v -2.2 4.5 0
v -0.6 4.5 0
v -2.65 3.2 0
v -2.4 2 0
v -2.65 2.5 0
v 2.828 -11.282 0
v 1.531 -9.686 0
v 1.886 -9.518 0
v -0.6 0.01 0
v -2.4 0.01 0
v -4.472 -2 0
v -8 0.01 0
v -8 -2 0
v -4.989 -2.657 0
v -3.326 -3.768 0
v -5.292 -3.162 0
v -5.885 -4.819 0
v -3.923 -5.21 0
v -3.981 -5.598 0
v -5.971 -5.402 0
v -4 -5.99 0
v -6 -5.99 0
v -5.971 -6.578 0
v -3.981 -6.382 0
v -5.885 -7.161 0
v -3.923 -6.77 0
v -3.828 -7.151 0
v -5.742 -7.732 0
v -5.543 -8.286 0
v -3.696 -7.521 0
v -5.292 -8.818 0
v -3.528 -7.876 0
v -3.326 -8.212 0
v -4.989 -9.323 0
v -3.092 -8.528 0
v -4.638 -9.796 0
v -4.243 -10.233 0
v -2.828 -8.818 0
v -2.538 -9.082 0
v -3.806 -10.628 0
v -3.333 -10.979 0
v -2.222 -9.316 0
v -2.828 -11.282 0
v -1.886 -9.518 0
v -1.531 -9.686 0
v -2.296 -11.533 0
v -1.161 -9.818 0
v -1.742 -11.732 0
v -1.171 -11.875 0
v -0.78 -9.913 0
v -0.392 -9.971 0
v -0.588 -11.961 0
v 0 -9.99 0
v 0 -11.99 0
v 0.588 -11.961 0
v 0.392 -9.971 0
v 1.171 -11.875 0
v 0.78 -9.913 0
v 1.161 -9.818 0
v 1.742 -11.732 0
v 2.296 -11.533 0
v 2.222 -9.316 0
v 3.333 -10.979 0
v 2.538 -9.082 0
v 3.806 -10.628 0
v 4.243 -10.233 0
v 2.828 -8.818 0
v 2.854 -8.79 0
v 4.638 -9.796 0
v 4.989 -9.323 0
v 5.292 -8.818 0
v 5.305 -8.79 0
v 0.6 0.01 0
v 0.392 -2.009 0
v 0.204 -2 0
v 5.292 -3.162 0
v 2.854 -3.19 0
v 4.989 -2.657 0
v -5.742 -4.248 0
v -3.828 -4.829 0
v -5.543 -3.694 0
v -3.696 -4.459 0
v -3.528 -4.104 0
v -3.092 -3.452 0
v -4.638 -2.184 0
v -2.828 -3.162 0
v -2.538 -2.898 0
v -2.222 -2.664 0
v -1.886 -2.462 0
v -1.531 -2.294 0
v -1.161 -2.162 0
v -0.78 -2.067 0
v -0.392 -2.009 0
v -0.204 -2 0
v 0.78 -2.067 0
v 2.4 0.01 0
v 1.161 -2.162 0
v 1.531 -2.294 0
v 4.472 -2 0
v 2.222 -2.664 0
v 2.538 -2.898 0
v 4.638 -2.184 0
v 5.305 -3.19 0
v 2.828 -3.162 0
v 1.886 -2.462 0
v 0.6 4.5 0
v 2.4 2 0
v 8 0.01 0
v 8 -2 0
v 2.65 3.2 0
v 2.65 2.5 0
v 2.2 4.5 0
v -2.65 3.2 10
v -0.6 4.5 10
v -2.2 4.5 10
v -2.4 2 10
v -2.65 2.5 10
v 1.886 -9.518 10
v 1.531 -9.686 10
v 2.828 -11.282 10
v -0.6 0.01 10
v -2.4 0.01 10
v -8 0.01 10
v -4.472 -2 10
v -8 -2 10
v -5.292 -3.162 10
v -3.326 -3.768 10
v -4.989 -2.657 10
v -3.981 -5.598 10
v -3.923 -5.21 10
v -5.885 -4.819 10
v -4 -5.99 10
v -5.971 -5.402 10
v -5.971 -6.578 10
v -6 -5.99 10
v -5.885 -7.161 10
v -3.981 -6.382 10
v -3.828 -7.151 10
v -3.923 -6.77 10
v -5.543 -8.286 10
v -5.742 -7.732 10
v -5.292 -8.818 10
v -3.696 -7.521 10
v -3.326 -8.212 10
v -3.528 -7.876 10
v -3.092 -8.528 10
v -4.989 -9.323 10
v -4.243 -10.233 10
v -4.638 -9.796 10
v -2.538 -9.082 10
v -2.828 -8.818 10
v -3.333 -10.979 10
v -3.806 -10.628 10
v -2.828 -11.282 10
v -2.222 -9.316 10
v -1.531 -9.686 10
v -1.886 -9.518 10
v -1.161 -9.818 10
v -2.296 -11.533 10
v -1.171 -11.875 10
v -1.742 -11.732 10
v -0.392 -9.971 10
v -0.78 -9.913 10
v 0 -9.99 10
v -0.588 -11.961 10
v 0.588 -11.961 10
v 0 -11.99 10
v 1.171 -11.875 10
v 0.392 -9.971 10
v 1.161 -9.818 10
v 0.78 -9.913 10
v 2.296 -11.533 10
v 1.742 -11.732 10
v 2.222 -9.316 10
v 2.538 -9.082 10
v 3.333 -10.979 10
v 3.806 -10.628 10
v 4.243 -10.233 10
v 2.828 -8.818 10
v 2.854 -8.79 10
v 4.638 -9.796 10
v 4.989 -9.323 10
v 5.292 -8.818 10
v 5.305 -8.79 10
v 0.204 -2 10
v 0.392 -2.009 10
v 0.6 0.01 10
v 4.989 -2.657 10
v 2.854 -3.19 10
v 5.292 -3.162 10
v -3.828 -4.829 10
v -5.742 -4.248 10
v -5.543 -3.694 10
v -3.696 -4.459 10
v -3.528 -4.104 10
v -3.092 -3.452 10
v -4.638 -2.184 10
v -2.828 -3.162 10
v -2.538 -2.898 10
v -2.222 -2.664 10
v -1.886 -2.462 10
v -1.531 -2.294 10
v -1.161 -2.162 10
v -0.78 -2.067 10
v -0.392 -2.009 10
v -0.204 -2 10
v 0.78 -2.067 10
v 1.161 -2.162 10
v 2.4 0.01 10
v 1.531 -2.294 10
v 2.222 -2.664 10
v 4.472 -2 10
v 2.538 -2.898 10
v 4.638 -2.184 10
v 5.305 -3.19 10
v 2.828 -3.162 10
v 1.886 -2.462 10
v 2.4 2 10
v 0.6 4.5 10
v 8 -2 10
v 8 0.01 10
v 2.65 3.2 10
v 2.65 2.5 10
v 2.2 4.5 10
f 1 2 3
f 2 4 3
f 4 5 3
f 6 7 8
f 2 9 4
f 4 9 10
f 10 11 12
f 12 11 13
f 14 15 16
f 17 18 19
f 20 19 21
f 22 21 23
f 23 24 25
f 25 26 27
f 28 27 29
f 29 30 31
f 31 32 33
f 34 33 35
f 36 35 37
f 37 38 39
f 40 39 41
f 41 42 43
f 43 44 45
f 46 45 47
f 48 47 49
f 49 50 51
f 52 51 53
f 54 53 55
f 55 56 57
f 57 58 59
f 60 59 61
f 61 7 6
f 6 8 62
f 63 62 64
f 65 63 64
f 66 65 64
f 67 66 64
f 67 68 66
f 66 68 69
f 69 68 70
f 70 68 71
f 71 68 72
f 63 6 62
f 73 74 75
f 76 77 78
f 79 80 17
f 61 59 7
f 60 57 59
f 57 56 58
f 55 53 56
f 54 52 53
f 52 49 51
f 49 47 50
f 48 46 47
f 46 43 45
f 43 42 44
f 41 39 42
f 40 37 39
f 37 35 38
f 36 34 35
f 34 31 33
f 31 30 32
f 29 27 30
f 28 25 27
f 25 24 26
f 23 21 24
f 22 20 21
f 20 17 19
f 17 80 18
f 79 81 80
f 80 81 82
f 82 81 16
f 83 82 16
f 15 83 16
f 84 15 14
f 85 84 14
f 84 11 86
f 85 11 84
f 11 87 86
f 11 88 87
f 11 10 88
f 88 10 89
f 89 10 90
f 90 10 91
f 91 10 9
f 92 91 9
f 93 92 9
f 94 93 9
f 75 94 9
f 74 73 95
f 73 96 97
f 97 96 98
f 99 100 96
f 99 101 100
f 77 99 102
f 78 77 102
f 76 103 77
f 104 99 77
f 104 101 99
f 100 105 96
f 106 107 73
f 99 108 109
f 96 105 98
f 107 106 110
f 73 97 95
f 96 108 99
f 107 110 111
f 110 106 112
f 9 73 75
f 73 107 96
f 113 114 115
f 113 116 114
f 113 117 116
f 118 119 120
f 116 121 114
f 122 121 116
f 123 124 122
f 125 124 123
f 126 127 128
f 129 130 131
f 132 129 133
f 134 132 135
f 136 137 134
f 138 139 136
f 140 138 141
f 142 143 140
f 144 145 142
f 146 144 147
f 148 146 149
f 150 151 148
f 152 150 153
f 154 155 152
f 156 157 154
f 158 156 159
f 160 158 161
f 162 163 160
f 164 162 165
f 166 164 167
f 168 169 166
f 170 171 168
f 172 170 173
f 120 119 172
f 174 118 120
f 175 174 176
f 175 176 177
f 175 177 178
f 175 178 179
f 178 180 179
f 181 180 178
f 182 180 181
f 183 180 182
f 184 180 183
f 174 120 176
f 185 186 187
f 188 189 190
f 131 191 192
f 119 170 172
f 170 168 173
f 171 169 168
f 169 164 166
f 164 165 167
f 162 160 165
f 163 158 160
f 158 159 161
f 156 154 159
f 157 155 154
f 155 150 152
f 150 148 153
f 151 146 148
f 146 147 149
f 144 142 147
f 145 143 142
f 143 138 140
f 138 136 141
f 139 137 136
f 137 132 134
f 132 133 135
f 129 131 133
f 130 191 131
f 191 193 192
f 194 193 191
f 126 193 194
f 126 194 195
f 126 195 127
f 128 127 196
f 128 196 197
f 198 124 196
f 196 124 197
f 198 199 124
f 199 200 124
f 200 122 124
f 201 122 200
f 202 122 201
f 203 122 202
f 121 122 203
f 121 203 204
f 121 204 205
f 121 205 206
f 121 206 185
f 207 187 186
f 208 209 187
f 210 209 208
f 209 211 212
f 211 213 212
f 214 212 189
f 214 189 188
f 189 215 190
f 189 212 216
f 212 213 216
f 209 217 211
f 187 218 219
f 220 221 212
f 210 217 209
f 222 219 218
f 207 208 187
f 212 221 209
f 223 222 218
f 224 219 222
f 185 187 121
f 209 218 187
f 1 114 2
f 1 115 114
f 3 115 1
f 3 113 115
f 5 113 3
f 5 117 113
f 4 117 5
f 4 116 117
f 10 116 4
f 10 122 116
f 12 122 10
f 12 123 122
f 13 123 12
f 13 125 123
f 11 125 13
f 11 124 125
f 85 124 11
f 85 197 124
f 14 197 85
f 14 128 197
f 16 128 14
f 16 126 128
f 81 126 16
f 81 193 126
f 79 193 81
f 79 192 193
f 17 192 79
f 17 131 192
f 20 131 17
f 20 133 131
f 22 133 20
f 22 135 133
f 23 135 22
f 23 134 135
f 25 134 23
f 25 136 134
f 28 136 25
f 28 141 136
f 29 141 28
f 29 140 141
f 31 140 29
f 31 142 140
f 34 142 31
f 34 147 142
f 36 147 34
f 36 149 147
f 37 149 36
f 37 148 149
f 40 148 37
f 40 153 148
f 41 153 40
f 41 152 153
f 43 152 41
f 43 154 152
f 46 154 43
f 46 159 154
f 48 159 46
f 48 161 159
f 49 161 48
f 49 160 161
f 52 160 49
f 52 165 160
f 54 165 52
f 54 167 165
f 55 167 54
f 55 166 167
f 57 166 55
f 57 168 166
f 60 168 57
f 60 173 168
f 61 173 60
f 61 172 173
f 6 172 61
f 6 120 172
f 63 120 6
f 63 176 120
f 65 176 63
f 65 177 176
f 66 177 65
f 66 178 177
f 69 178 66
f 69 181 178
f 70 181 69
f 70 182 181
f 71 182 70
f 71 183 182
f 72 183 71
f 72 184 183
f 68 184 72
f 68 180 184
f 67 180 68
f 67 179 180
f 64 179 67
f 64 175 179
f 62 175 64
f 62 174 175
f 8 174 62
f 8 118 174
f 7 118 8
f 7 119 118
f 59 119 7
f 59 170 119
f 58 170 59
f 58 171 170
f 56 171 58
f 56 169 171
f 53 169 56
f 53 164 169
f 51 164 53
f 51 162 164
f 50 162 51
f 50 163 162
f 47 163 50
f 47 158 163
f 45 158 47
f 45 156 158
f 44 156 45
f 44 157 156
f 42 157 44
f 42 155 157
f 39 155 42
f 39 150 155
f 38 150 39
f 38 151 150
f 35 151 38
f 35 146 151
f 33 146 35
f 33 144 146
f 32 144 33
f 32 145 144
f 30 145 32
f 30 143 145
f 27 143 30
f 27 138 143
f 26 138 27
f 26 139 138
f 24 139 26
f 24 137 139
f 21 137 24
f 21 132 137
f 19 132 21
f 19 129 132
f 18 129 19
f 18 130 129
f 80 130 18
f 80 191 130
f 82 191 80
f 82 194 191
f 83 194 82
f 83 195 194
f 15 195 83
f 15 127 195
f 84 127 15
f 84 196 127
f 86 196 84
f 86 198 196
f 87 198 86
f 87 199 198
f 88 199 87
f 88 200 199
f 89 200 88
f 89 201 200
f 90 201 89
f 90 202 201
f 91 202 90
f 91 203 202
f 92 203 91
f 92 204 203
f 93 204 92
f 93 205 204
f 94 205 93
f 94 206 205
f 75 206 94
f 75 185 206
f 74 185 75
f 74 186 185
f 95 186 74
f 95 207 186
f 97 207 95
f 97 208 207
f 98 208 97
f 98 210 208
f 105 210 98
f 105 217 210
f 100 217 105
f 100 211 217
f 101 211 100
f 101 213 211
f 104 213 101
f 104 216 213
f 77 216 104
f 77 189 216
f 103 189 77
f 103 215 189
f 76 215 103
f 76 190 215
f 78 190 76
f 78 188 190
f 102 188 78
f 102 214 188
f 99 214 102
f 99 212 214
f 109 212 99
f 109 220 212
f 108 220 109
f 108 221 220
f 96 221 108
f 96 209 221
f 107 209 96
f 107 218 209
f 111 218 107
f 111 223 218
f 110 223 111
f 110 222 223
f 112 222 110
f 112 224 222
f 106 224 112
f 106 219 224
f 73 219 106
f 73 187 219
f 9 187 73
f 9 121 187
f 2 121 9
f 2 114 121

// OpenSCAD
// Cable clip for the BACK of the SKÅDIS board: a split peg pushes into any slot from behind
// and grips by spring (nothing shows on the front), and an open ring holds the cables of
// whatever hangs on the board, running down the back to the desk's wall gap.
//
// Section, z out of the back face (board z 0..5, front at 5), x across the slot:
//   two prongs 1.8 wide with a 1.2 gap, 4.5 long, a 0.25 bump each side at 2..3.5 deep, so
//   the peg is 5.3 at the bump in a 5 mm slot and squeezes to fit; tips chamfered to lead in.
//   10 mm along the slot, inside its straight part, so the rounded ends never touch.
// Ring behind the 2 mm plate: `cable` inside, opening to one side.
//
// Print standing on an end, as saved (everything is an extrusion along the slot), PETG.
//   openscad -o skadis-cable-clip-x6.stl skadis-cable-clip.scad

cable = 8;      // ring inside diameter: a bundle of 2 or 3 thin leads, or one power cord
wall = 2;
gap = 0.7;      // ring opening as a fraction of `cable`
len = 10;       // along the slot (straight part of a 15 mm slot is 10)
plate = 2;

module prong2d(s) {   // s = +1 right, -1 left
    mirror([s < 0 ? 1 : 0, 0])
    polygon([[0.6, 0], [2.4, 0], [2.4, 2], [2.65, 2.5], [2.65, 3.2], [2.2, 4.5], [0.6, 4.5]]);
}
module section2d() {
    prong2d(1); prong2d(-1);
    translate([-8, -plate]) square([16, plate + 0.01]);                       // plate on the back face
    r = cable / 2 + wall;
    translate([0, -plate - cable / 2 + 0.01]) difference() {                  // ring
        circle(r = r, $fn = 64);
        circle(d = cable, $fn = 64);
        translate([0, -cable * gap / 2]) square([r + 1, cable * gap]);       // opening to the side
    }
}
linear_extrude(len) section2d();
